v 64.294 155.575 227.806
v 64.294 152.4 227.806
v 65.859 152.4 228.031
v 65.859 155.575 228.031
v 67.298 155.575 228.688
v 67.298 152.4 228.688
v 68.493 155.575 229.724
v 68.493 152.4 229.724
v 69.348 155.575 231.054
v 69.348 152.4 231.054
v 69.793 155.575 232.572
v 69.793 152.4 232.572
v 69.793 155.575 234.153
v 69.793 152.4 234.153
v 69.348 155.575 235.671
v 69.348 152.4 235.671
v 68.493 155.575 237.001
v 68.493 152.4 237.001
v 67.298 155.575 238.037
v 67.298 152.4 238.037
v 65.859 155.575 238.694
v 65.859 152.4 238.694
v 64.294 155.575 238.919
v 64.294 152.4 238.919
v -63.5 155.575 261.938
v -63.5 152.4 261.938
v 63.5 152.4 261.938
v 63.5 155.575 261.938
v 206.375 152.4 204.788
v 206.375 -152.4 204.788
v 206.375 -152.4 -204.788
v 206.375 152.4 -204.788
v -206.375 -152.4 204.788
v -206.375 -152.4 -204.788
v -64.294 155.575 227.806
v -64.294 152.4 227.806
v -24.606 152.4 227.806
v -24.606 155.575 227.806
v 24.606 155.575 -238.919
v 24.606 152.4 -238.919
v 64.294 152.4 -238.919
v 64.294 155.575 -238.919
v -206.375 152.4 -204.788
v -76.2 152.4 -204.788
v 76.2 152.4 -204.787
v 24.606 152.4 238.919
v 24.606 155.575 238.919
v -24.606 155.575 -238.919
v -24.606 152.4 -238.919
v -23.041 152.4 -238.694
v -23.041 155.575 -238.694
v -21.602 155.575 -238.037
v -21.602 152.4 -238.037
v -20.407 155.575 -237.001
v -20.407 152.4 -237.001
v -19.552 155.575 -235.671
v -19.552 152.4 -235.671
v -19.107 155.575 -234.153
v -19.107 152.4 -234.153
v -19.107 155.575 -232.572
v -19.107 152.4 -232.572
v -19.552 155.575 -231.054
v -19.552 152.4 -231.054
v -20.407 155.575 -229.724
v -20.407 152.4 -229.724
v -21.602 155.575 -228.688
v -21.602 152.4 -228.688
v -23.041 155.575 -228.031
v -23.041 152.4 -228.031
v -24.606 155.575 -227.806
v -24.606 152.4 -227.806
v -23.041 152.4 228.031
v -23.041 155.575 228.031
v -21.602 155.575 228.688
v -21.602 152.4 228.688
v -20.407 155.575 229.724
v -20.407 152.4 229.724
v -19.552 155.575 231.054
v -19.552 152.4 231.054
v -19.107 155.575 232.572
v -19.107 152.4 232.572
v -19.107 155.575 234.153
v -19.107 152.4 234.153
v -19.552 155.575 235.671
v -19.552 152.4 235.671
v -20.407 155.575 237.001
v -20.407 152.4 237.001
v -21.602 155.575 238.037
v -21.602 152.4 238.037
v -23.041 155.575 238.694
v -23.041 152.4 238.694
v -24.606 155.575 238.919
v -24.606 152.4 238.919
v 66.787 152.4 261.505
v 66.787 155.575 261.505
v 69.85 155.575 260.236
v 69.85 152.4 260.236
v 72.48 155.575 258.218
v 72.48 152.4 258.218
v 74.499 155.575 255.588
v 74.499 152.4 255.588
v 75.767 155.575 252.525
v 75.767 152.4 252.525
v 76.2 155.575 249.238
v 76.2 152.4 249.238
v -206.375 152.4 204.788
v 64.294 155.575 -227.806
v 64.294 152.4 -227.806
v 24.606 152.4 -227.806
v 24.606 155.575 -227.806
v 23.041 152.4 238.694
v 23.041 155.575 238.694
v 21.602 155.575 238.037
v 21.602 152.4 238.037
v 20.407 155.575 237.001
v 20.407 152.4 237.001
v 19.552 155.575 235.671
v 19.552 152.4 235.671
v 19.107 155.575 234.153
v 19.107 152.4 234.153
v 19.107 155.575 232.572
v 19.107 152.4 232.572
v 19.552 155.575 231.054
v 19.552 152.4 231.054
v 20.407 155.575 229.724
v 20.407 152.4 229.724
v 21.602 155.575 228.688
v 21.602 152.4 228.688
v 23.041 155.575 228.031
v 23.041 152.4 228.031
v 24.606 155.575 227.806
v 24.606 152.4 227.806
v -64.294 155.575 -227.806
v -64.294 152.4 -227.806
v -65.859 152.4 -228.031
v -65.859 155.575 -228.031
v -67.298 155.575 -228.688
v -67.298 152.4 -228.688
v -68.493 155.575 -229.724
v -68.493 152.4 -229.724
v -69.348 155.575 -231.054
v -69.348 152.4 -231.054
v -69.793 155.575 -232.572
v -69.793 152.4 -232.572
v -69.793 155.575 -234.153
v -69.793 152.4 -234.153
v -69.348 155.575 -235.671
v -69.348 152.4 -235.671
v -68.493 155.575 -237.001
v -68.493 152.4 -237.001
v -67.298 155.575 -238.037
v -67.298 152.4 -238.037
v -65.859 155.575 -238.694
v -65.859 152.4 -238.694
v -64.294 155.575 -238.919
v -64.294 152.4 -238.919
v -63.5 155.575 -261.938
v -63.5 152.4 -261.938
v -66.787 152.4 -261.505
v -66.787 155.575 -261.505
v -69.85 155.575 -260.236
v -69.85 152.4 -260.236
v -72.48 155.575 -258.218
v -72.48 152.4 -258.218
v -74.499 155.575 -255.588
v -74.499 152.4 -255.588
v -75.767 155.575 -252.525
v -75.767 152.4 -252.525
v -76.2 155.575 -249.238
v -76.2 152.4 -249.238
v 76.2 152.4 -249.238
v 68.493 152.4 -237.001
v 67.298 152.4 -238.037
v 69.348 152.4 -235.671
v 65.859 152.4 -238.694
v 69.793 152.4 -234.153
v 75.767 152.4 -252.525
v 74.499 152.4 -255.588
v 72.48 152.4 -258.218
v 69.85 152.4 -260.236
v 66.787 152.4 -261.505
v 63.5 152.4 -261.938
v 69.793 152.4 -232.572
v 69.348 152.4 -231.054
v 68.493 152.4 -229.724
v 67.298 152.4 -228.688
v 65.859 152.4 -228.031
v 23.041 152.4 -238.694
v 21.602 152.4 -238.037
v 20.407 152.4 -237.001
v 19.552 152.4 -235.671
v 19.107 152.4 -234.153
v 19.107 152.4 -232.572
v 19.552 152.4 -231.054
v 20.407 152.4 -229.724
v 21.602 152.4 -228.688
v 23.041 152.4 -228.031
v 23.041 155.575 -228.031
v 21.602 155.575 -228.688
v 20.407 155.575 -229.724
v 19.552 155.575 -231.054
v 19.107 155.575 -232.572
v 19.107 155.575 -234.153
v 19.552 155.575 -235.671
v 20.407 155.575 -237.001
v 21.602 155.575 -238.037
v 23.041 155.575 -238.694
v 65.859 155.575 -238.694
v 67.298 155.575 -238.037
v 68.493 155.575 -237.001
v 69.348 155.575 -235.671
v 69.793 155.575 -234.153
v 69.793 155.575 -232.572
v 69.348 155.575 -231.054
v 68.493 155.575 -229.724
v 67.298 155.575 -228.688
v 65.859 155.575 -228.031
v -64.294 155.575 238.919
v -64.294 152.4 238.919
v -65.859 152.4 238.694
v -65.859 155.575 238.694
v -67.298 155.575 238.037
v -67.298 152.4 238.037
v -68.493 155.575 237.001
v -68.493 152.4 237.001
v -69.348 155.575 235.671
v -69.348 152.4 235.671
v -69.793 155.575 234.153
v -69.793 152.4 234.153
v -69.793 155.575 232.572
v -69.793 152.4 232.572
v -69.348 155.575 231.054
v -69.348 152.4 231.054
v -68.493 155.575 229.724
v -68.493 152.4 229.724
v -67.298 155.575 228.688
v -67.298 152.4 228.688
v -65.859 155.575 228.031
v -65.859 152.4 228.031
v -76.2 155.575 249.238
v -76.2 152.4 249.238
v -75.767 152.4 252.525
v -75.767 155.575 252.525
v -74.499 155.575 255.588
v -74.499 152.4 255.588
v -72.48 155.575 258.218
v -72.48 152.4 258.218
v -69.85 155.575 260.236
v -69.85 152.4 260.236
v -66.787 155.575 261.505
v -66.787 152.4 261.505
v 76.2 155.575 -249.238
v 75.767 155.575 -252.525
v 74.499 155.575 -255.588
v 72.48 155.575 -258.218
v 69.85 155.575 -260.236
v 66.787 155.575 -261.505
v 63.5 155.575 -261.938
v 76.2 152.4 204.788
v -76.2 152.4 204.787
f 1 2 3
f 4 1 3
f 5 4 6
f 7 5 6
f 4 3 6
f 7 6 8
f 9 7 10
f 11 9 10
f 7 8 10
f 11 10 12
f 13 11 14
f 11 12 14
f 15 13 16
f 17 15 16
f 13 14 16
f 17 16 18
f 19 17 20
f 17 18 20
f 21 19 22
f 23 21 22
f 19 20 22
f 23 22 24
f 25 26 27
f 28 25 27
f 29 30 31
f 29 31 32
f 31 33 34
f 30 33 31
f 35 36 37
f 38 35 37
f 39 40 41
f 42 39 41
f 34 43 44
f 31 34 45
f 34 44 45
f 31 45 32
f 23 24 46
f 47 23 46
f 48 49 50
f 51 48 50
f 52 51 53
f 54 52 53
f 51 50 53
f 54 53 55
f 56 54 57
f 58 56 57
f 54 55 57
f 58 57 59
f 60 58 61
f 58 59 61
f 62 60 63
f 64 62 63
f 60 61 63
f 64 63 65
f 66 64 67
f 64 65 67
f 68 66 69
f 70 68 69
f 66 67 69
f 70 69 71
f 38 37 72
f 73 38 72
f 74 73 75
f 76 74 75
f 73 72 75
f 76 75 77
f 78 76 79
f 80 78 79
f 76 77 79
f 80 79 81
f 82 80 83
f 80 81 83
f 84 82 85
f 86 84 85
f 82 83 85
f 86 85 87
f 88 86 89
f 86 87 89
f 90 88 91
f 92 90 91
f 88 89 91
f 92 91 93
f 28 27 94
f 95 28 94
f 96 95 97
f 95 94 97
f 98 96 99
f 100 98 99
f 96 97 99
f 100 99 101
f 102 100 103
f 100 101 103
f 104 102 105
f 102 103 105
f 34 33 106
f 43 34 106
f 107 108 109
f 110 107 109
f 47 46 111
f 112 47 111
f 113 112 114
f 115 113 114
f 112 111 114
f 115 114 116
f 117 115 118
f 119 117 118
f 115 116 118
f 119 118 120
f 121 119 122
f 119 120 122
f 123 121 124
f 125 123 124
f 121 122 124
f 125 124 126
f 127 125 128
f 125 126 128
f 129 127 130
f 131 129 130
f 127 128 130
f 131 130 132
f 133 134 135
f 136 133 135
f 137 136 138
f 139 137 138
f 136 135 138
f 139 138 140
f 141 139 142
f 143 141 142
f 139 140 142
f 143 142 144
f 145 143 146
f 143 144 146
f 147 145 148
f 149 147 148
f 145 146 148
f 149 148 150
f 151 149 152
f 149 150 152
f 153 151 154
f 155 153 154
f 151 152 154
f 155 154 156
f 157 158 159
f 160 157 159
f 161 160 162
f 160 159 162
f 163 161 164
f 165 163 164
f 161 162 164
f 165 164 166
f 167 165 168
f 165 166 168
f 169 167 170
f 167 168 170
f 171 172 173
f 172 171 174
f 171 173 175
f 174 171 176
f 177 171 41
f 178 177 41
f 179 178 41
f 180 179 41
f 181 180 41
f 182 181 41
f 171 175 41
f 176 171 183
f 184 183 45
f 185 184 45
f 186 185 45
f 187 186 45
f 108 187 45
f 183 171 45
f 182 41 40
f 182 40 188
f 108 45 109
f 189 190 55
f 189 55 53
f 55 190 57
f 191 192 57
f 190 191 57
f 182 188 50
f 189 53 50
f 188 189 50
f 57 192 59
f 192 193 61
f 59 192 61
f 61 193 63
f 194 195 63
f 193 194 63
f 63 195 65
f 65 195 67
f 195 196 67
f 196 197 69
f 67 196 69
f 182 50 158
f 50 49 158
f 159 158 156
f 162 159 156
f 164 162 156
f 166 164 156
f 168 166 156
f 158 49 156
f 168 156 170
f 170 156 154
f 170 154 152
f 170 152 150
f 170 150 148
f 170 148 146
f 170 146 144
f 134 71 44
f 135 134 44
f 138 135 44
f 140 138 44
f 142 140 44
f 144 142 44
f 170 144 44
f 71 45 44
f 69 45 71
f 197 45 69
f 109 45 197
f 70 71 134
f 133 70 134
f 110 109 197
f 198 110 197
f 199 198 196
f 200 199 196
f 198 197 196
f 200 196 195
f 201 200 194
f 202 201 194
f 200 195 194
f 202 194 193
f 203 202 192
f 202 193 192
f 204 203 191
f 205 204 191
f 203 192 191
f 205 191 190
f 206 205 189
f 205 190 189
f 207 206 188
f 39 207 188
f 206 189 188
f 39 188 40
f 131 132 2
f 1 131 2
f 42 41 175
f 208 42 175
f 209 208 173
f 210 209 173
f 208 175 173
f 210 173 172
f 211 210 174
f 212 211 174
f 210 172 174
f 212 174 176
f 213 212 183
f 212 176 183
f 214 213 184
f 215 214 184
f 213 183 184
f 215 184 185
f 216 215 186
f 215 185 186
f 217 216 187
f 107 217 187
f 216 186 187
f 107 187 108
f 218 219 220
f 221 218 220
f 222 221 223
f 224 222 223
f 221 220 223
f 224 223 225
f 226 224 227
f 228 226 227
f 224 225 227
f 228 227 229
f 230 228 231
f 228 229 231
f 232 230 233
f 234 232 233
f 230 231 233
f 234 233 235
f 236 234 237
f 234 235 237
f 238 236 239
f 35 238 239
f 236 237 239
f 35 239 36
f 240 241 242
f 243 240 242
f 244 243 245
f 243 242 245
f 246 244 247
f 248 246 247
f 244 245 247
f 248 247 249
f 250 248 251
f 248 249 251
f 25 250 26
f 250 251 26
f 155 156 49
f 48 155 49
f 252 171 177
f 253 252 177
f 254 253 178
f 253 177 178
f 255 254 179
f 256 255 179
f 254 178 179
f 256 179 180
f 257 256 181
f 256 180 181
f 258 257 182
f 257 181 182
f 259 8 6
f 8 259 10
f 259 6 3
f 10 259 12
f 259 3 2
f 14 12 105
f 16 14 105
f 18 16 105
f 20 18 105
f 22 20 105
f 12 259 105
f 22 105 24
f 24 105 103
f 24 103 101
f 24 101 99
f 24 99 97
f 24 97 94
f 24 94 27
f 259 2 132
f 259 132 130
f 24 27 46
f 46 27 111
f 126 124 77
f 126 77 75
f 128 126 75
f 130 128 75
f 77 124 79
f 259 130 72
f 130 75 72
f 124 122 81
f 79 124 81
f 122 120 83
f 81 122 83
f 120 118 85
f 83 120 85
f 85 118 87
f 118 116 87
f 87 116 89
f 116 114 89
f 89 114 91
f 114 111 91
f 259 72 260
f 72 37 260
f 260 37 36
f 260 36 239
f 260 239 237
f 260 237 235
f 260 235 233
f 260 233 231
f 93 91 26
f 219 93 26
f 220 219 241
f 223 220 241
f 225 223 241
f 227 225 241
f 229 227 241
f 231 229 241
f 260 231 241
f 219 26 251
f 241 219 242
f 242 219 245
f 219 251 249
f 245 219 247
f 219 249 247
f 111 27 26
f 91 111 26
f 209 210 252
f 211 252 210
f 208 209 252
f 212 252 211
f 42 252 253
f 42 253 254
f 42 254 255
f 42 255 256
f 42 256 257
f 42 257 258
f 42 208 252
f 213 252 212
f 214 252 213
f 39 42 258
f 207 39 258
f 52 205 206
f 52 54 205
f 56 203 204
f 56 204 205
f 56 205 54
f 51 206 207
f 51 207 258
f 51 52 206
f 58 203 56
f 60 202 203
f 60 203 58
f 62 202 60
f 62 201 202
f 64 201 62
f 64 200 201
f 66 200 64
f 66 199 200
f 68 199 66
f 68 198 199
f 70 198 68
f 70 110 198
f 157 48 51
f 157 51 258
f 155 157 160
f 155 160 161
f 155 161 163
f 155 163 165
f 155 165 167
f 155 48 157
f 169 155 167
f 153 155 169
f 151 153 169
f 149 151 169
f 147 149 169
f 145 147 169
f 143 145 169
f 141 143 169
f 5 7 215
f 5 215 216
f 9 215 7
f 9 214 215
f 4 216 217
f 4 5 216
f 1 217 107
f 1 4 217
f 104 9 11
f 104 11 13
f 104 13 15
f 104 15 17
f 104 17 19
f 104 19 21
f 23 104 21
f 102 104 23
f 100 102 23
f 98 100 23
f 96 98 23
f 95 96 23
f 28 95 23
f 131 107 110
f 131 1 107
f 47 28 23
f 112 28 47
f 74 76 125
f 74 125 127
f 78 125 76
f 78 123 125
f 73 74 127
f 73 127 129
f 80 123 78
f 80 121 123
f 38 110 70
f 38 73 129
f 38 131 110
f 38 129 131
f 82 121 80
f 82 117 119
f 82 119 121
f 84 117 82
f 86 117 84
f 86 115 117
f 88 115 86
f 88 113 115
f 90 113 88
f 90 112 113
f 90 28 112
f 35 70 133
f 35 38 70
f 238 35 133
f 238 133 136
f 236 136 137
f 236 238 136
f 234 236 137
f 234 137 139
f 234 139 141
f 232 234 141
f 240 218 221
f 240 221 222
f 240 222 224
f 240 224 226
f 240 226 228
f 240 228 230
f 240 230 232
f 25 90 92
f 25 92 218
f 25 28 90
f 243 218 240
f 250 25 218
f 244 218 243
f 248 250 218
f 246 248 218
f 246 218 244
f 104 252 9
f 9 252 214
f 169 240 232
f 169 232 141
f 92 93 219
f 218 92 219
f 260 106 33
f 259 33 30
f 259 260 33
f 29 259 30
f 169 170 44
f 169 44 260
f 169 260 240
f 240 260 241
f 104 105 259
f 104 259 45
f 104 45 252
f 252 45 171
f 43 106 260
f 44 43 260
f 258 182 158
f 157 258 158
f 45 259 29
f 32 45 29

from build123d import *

# Parameters (mm, degrees)
F0_W     = 412.75
F0_H     = 304.8
F1_DEPTH = 204.7875
F3_DEPTH = 3.175


with BuildPart() as f1:
    # F0 (on Top) → F1 (new body, symmetric)
    with BuildSketch(Plane.XY):
        Rectangle(F0_W, F0_H)
    extrude(amount=F1_DEPTH, both=True)

    # F2 (on face) → F3 (join)
    with BuildSketch(Plane(origin=(0, 152.4, 0), x_dir=(-1, 0, 0), z_dir=(0, 1, 0))):
        with BuildLine():
            ThreePointArc((76.2, 249.2375), (72.4802561211, 258.2177561211), (63.5, 261.9375))
            Line((63.5, 261.9375), (-63.5, 261.9375))
            ThreePointArc((-63.5, 261.9375), (-72.4802561211, 258.2177561211), (-76.2, 249.2375))
            Line((-76.2, 249.2375), (-76.2, -249.2375))
            ThreePointArc((-76.2, -249.2375), (-72.4802561211, -258.2177561211), (-63.5, -261.9375))
            Line((-63.5, -261.9375), (63.5, -261.9375))
            ThreePointArc((63.5, -261.9375), (72.4802561211, -258.2177561211), (76.2, -249.2375))
            Line((76.2, -249.2375), (76.2, 249.2375))
        make_face()
        with BuildLine():
            Line((-64.29375, -227.80625), (-24.60625, -227.80625))
            ThreePointArc((-24.60625, -227.80625), (-19.05, -233.3625), (-24.60625, -238.91875))
            Line((-24.60625, -238.91875), (-64.29375, -238.91875))
            ThreePointArc((-64.29375, -238.91875), (-69.85, -233.3625), (-64.29375, -227.80625))
        make_face(mode=Mode.SUBTRACT)
        with BuildLine():
            Line((24.60625, -227.80625), (64.29375, -227.80625))
            ThreePointArc((64.29375, -227.80625), (69.85, -233.3625), (64.29375, -238.91875))
            Line((64.29375, -238.91875), (24.60625, -238.91875))
            ThreePointArc((24.60625, -238.91875), (19.05, -233.3625), (24.60625, -227.80625))
        make_face(mode=Mode.SUBTRACT)
        with BuildLine():
            Line((-64.29375, 238.91875), (-24.60625, 238.91875))
            ThreePointArc((-24.60625, 238.91875), (-19.05, 233.3625), (-24.60625, 227.80625))
            Line((-24.60625, 227.80625), (-64.29375, 227.80625))
            ThreePointArc((-64.29375, 227.80625), (-69.85, 233.3625), (-64.29375, 238.91875))
        make_face(mode=Mode.SUBTRACT)
        with BuildLine():
            Line((24.60625, 238.91875), (64.29375, 238.91875))
            ThreePointArc((64.29375, 238.91875), (69.85, 233.3625), (64.29375, 227.80625))
            Line((64.29375, 227.80625), (24.60625, 227.80625))
            ThreePointArc((24.60625, 227.80625), (19.05, 233.3625), (24.60625, 238.91875))
        make_face(mode=Mode.SUBTRACT)
    extrude(amount=F3_DEPTH)


solid = f1.part
